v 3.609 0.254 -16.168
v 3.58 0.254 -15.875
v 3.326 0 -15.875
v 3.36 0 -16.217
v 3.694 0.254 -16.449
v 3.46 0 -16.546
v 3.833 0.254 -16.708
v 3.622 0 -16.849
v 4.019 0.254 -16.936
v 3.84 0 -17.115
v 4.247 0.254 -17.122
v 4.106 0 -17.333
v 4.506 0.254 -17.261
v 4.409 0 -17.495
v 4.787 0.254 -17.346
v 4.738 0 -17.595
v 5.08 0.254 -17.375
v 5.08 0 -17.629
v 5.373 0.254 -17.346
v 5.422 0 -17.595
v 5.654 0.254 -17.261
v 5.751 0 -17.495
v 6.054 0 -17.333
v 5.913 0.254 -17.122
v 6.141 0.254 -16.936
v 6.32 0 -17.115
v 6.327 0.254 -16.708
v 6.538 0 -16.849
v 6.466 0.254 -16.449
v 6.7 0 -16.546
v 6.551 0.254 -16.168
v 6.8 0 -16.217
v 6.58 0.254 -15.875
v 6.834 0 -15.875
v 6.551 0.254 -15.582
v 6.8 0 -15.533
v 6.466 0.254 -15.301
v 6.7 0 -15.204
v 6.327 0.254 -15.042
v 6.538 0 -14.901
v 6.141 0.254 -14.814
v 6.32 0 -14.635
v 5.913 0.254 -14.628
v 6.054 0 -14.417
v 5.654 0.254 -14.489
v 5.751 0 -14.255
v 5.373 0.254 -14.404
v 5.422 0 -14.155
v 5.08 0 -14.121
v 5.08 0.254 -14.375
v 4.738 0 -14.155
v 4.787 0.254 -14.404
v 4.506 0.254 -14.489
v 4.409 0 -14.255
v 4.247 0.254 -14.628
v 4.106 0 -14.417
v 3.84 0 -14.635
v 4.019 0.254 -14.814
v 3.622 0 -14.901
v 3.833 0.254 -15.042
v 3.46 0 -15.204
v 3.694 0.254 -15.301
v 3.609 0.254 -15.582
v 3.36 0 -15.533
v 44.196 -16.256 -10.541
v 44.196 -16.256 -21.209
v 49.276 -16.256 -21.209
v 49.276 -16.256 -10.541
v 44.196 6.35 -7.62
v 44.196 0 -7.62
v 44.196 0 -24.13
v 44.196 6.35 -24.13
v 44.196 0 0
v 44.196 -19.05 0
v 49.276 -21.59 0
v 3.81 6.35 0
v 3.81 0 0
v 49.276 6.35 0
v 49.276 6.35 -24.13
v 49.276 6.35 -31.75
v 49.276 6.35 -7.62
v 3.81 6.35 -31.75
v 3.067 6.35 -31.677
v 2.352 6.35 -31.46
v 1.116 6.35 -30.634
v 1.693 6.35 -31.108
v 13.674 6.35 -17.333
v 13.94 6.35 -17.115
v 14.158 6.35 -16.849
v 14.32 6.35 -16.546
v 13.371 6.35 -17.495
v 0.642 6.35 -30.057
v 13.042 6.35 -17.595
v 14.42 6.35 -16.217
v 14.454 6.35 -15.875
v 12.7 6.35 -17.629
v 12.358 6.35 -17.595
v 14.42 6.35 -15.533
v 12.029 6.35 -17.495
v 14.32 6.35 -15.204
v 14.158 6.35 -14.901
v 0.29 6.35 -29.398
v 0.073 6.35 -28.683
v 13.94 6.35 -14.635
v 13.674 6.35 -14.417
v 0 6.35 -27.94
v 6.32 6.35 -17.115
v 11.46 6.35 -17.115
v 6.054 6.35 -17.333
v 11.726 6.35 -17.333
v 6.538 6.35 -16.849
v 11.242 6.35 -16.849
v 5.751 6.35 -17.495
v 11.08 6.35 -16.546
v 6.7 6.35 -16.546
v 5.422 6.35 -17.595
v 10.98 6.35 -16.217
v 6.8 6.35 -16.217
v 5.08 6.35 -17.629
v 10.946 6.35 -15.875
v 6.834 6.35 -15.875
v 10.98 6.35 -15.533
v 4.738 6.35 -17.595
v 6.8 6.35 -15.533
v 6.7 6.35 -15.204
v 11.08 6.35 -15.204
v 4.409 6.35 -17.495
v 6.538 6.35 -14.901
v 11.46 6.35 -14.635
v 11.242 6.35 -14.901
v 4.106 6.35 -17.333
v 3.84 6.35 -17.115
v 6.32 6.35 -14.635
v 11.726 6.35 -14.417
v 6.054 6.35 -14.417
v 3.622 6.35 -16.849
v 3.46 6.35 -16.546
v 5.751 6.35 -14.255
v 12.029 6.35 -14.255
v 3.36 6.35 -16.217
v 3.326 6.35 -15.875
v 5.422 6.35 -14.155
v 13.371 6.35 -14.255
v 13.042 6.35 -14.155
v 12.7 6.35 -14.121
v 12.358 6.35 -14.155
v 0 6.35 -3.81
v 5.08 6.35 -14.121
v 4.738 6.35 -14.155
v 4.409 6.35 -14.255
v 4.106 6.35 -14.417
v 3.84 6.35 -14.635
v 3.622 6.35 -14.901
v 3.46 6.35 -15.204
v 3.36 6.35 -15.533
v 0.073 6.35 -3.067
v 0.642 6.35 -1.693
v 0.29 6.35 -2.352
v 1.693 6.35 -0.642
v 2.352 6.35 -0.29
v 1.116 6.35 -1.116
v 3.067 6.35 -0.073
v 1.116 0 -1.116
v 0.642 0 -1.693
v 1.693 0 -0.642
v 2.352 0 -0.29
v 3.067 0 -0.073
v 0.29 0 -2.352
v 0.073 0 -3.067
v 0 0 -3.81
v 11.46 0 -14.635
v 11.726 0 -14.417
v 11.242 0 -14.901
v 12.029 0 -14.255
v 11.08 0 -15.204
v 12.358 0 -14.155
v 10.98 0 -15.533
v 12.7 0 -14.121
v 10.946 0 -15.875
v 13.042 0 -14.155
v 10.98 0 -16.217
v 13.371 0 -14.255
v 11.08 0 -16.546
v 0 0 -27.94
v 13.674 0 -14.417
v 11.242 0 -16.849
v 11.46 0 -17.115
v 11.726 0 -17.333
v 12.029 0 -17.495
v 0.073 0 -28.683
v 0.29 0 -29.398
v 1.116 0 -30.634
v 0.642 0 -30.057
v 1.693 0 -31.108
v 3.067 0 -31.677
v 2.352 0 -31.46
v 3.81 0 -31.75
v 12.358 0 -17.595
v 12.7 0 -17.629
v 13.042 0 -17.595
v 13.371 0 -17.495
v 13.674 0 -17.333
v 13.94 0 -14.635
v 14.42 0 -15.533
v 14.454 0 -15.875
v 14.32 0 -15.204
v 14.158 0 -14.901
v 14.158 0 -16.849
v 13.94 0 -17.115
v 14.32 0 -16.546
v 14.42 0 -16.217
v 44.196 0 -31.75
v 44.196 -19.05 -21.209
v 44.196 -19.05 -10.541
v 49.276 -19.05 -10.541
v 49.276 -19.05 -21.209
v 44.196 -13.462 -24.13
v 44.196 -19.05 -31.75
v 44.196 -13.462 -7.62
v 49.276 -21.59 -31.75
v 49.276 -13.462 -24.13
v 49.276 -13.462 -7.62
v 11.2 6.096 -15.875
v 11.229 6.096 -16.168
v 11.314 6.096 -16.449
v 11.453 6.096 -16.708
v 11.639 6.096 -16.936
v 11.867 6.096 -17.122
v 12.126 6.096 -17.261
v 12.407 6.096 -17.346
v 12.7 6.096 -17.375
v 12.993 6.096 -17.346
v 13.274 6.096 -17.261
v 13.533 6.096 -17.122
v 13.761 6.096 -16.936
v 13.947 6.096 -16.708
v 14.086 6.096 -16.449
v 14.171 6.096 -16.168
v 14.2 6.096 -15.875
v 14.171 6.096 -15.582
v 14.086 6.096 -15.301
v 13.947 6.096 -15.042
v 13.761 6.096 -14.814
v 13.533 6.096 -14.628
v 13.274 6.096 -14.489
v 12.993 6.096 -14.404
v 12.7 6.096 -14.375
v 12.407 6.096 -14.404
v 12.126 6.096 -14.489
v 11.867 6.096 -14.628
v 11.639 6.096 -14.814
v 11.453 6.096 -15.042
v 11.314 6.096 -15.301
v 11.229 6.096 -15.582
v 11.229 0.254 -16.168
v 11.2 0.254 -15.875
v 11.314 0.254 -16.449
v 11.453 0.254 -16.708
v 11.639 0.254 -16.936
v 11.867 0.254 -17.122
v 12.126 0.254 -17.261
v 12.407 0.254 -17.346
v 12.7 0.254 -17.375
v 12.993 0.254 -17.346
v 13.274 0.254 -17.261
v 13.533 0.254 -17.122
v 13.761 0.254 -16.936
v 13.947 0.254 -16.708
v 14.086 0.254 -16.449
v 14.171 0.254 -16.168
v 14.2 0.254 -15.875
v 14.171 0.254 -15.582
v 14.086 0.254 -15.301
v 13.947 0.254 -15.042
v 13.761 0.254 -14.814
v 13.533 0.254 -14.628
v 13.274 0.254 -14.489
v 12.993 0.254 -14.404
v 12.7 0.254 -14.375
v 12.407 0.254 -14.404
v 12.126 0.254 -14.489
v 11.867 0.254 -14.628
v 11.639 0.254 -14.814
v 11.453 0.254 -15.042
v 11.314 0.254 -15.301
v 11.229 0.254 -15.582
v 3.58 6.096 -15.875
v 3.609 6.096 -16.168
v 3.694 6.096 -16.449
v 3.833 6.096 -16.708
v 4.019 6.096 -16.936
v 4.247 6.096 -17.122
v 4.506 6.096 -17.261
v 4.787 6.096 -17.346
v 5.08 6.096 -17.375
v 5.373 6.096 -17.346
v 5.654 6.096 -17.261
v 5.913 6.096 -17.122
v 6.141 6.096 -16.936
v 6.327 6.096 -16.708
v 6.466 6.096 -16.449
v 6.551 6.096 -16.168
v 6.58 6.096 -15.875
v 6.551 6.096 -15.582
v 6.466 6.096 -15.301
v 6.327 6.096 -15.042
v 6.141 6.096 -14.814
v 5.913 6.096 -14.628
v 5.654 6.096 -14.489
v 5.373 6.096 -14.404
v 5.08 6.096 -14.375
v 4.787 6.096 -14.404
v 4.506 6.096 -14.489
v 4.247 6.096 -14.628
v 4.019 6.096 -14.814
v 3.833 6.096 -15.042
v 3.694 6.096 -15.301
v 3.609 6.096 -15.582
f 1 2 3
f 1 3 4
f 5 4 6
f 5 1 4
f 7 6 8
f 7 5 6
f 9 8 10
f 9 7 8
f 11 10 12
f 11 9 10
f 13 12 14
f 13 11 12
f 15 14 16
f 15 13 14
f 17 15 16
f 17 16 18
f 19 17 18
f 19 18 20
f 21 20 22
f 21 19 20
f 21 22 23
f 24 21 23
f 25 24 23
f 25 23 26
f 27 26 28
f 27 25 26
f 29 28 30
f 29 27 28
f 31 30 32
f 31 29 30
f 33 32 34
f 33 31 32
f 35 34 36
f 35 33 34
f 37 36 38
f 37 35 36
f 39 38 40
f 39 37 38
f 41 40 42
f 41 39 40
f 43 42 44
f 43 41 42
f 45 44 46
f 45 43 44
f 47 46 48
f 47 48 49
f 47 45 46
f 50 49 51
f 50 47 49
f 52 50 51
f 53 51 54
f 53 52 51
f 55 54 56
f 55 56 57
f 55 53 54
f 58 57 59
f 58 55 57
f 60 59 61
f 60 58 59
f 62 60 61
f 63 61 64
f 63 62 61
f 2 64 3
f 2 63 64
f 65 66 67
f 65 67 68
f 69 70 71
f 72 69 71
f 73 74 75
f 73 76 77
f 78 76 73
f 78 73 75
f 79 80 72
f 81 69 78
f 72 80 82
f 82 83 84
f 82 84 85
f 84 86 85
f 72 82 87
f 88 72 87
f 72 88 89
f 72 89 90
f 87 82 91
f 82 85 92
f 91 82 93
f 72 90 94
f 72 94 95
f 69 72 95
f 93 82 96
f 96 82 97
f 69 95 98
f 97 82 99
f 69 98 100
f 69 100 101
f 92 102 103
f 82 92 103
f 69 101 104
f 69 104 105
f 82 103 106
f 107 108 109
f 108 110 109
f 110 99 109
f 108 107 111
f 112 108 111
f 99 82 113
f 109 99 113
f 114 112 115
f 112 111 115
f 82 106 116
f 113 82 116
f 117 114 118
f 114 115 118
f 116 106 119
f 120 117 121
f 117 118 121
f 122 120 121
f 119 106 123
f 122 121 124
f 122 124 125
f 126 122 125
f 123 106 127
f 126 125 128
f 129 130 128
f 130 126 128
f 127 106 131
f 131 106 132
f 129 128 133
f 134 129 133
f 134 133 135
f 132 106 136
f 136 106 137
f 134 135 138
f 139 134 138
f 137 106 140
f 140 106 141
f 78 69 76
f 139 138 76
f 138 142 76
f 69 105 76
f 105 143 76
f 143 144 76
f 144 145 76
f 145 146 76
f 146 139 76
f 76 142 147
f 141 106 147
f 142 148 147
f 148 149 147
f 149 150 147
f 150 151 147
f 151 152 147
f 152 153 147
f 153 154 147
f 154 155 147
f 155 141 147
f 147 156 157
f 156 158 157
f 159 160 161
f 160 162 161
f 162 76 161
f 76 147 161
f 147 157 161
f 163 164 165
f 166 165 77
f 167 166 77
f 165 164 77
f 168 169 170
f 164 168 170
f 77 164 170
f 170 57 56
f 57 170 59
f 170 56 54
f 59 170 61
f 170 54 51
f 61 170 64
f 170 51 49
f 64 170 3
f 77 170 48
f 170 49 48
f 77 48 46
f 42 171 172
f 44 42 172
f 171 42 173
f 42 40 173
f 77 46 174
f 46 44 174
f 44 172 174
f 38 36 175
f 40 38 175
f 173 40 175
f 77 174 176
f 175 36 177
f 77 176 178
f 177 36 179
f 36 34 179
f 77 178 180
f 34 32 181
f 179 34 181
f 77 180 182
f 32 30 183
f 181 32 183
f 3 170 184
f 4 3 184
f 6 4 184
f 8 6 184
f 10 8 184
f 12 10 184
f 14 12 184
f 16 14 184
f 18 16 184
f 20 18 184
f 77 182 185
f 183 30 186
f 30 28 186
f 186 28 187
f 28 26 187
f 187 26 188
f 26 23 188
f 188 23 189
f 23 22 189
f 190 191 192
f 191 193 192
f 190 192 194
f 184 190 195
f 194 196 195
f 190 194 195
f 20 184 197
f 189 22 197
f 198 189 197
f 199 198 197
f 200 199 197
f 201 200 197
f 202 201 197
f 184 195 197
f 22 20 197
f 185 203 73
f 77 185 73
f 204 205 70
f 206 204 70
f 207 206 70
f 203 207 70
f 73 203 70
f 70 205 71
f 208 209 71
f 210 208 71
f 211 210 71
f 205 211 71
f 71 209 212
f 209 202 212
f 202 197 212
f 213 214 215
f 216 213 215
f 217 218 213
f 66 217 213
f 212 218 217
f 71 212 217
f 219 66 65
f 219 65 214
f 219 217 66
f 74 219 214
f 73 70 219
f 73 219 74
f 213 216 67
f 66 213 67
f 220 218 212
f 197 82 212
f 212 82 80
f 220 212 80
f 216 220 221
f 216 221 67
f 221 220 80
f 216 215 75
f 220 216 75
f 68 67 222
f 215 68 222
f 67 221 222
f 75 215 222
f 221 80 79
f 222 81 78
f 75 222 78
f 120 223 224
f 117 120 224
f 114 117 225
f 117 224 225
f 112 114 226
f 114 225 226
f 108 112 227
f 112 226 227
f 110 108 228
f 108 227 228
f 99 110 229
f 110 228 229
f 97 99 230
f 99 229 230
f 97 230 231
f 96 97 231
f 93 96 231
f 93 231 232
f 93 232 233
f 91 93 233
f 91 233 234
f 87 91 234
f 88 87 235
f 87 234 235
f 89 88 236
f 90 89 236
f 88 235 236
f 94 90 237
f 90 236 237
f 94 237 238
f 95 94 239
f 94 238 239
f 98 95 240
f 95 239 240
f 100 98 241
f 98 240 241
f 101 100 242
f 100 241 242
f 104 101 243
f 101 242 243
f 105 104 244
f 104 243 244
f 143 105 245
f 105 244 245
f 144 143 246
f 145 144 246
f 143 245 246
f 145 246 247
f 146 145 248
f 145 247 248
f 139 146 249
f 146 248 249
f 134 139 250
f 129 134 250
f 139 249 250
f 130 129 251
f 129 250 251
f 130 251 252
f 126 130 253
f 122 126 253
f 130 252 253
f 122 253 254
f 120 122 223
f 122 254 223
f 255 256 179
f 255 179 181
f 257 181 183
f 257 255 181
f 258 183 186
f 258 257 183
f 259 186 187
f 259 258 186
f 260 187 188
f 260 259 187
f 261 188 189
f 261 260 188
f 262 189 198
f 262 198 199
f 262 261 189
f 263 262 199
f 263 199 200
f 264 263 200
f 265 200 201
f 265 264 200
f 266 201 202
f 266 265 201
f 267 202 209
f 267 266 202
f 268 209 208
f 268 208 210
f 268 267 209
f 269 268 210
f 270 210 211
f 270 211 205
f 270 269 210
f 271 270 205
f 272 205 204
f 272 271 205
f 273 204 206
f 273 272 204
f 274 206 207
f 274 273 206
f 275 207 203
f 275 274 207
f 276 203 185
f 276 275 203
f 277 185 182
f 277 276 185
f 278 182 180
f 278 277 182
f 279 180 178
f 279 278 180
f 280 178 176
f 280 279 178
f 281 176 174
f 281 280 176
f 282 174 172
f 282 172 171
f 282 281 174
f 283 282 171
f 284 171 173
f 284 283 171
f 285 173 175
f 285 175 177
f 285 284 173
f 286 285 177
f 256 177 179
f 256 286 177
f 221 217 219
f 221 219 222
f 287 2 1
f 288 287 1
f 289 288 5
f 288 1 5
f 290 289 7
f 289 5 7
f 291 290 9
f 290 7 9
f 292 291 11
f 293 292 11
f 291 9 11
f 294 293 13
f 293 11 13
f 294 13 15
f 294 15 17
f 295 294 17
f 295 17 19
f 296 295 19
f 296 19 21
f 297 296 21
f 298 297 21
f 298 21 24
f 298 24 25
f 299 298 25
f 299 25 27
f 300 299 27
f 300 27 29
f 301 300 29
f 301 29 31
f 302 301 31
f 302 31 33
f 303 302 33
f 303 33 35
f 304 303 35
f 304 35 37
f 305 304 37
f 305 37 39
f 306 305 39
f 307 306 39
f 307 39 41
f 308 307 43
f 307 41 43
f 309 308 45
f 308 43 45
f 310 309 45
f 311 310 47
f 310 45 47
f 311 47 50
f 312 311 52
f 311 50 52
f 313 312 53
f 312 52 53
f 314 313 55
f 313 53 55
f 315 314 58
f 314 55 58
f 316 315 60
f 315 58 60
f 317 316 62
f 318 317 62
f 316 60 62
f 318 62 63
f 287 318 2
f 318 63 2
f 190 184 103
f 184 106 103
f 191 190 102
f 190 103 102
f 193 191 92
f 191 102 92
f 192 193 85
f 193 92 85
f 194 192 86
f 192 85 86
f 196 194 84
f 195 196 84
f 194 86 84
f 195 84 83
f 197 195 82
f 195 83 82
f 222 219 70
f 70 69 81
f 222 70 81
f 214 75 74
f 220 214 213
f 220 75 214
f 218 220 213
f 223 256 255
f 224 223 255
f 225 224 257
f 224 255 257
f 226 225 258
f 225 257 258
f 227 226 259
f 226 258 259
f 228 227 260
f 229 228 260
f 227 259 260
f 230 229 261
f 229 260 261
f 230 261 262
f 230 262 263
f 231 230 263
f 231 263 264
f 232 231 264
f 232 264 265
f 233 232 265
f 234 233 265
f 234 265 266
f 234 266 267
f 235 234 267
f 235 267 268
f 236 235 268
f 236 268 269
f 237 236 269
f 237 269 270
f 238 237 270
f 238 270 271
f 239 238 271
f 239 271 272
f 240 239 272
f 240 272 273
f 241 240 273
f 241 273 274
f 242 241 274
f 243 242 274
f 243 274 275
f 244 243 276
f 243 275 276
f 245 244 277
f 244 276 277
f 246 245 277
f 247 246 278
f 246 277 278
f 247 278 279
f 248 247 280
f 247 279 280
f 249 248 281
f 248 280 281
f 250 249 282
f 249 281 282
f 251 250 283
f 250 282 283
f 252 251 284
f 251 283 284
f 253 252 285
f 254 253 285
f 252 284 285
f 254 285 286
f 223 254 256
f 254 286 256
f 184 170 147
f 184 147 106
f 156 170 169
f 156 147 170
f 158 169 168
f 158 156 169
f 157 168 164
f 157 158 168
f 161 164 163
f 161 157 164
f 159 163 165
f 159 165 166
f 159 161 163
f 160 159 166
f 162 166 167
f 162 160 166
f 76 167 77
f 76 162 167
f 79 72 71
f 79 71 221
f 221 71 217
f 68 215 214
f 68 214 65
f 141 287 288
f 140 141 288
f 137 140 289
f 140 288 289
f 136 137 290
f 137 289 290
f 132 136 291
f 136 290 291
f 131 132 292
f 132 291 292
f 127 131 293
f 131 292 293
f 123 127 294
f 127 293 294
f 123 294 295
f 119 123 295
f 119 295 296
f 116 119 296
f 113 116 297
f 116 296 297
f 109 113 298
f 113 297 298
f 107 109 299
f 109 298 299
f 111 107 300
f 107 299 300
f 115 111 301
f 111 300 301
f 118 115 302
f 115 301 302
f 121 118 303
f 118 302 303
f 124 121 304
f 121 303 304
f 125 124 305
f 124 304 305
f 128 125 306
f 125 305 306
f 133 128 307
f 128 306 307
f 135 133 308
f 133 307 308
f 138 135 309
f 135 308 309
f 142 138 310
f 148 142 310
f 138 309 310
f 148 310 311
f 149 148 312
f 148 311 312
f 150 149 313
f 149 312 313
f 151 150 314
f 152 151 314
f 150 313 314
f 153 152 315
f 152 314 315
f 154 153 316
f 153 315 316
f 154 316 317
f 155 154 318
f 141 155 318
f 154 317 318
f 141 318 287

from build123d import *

# Parameters (mm, degrees)
SKETCH1_W             = 44.196
SKETCH1_H             = 31.75
BOSS_EXTRUDE1_DEPTH   = 6.35
F_3_0MM_DOWEL_HOLE1_D = 3
CHAMFER1_SIZE         = 0.254
FILLET2_R             = 3.81
BOSS_EXTRUDE4_DEPTH   = 5.08
SKETCH7_W             = 10.668
SKETCH7_H             = 2.794
CUT_EXTRUDE1_DEPTH    = 58.656321561
SKETCH8_W             = 5.08
SKETCH8_H             = 31.75
BOSS_EXTRUDE5_DEPTH   = 2.54
CUT_EXTRUDE2_DEPTH    = 63.468510275
SKETCH10_W            = 5.08
SKETCH10_H            = 16.51
CUT_EXTRUDE3_DEPTH    = 2.032


with BuildPart() as part:
    # Sketch1 → Boss-Extrude1 (new body)
    with BuildSketch(Plane(origin=(0, 0, 0), x_dir=(1, 0, 0), z_dir=(0, 1, 0))):
        with Locations((22.098, 15.875)):
            Rectangle(SKETCH1_W, SKETCH1_H)
    extrude(amount=BOSS_EXTRUDE1_DEPTH)

    # Ø3.0mm Dowel Hole1 (through all)
    with Locations(Plane(origin=(0, 6.35, 0), x_dir=(1, 0, 0), z_dir=(0, 1, 0))):
        with Locations((5.08, 15.875), (12.7, 15.875)):
            Hole(F_3_0MM_DOWEL_HOLE1_D / 2)

    # Chamfer1
    chamfer1_edges = [part.edges().sort_by_distance(p)[0] for p in [
        (14.2, 6.35, -15.875),
        (14.2, 0, -15.875),
        (6.58, 6.35, -15.875),
        (6.58, 0, -15.875),
    ]]
    chamfer(chamfer1_edges, length=CHAMFER1_SIZE)

    # Fillet2
    fillet2_edges = [part.edges().sort_by_distance(p)[0] for p in [
        (0, 3.175, -31.75),
        (0, 3.175, 0),
    ]]
    fillet(fillet2_edges, radius=FILLET2_R)

    # Sketch6 → Boss-Extrude4 (add)
    with BuildSketch(Plane(origin=(44.196, 0, 0), x_dir=(0, 0, -1), z_dir=(1, 0, 0))):
        Polygon((0, 6.35), (0, -19.05), (31.75, -19.05), (31.75, 6.35), (24.13, 6.35), (24.13, -11.43), (7.62, -11.43), (7.62, 6.35), align=None)
    extrude(amount=BOSS_EXTRUDE4_DEPTH)

    # Sketch7 → Cut-Extrude1 (cut, through all)
    with BuildSketch(Plane.ZY.offset(-44.196)):
        with Locations((-15.875, -17.653)):
            Rectangle(SKETCH7_W, SKETCH7_H)
    extrude(amount=-CUT_EXTRUDE1_DEPTH, mode=Mode.SUBTRACT)

    # Sketch8 → Boss-Extrude5 (add)
    with BuildSketch(Plane.XZ.offset(19.05)):
        with Locations((46.736, -15.875)):
            Rectangle(SKETCH8_W, SKETCH8_H)
    extrude(amount=BOSS_EXTRUDE5_DEPTH)

    # Sketch9 → Cut-Extrude2 (cut, through all)
    with BuildSketch(Plane(origin=(0, 0, -31.75), x_dir=(-1, 0, 0), z_dir=(0, 0, -1))):
        Polygon((-49.276, -21.59), (-44.196, -19.05), (-44.196, -21.59), align=None)
    extrude(amount=-CUT_EXTRUDE2_DEPTH, mode=Mode.SUBTRACT)

    # Sketch10 → Cut-Extrude3 (cut)
    with BuildSketch(Plane(origin=(0, -11.43, 0), x_dir=(1, 0, 0), z_dir=(0, 1, 0))):
        with Locations((46.736, 15.875)):
            Rectangle(SKETCH10_W, SKETCH10_H)
    extrude(amount=-CUT_EXTRUDE3_DEPTH, mode=Mode.SUBTRACT)


solid = part.part
